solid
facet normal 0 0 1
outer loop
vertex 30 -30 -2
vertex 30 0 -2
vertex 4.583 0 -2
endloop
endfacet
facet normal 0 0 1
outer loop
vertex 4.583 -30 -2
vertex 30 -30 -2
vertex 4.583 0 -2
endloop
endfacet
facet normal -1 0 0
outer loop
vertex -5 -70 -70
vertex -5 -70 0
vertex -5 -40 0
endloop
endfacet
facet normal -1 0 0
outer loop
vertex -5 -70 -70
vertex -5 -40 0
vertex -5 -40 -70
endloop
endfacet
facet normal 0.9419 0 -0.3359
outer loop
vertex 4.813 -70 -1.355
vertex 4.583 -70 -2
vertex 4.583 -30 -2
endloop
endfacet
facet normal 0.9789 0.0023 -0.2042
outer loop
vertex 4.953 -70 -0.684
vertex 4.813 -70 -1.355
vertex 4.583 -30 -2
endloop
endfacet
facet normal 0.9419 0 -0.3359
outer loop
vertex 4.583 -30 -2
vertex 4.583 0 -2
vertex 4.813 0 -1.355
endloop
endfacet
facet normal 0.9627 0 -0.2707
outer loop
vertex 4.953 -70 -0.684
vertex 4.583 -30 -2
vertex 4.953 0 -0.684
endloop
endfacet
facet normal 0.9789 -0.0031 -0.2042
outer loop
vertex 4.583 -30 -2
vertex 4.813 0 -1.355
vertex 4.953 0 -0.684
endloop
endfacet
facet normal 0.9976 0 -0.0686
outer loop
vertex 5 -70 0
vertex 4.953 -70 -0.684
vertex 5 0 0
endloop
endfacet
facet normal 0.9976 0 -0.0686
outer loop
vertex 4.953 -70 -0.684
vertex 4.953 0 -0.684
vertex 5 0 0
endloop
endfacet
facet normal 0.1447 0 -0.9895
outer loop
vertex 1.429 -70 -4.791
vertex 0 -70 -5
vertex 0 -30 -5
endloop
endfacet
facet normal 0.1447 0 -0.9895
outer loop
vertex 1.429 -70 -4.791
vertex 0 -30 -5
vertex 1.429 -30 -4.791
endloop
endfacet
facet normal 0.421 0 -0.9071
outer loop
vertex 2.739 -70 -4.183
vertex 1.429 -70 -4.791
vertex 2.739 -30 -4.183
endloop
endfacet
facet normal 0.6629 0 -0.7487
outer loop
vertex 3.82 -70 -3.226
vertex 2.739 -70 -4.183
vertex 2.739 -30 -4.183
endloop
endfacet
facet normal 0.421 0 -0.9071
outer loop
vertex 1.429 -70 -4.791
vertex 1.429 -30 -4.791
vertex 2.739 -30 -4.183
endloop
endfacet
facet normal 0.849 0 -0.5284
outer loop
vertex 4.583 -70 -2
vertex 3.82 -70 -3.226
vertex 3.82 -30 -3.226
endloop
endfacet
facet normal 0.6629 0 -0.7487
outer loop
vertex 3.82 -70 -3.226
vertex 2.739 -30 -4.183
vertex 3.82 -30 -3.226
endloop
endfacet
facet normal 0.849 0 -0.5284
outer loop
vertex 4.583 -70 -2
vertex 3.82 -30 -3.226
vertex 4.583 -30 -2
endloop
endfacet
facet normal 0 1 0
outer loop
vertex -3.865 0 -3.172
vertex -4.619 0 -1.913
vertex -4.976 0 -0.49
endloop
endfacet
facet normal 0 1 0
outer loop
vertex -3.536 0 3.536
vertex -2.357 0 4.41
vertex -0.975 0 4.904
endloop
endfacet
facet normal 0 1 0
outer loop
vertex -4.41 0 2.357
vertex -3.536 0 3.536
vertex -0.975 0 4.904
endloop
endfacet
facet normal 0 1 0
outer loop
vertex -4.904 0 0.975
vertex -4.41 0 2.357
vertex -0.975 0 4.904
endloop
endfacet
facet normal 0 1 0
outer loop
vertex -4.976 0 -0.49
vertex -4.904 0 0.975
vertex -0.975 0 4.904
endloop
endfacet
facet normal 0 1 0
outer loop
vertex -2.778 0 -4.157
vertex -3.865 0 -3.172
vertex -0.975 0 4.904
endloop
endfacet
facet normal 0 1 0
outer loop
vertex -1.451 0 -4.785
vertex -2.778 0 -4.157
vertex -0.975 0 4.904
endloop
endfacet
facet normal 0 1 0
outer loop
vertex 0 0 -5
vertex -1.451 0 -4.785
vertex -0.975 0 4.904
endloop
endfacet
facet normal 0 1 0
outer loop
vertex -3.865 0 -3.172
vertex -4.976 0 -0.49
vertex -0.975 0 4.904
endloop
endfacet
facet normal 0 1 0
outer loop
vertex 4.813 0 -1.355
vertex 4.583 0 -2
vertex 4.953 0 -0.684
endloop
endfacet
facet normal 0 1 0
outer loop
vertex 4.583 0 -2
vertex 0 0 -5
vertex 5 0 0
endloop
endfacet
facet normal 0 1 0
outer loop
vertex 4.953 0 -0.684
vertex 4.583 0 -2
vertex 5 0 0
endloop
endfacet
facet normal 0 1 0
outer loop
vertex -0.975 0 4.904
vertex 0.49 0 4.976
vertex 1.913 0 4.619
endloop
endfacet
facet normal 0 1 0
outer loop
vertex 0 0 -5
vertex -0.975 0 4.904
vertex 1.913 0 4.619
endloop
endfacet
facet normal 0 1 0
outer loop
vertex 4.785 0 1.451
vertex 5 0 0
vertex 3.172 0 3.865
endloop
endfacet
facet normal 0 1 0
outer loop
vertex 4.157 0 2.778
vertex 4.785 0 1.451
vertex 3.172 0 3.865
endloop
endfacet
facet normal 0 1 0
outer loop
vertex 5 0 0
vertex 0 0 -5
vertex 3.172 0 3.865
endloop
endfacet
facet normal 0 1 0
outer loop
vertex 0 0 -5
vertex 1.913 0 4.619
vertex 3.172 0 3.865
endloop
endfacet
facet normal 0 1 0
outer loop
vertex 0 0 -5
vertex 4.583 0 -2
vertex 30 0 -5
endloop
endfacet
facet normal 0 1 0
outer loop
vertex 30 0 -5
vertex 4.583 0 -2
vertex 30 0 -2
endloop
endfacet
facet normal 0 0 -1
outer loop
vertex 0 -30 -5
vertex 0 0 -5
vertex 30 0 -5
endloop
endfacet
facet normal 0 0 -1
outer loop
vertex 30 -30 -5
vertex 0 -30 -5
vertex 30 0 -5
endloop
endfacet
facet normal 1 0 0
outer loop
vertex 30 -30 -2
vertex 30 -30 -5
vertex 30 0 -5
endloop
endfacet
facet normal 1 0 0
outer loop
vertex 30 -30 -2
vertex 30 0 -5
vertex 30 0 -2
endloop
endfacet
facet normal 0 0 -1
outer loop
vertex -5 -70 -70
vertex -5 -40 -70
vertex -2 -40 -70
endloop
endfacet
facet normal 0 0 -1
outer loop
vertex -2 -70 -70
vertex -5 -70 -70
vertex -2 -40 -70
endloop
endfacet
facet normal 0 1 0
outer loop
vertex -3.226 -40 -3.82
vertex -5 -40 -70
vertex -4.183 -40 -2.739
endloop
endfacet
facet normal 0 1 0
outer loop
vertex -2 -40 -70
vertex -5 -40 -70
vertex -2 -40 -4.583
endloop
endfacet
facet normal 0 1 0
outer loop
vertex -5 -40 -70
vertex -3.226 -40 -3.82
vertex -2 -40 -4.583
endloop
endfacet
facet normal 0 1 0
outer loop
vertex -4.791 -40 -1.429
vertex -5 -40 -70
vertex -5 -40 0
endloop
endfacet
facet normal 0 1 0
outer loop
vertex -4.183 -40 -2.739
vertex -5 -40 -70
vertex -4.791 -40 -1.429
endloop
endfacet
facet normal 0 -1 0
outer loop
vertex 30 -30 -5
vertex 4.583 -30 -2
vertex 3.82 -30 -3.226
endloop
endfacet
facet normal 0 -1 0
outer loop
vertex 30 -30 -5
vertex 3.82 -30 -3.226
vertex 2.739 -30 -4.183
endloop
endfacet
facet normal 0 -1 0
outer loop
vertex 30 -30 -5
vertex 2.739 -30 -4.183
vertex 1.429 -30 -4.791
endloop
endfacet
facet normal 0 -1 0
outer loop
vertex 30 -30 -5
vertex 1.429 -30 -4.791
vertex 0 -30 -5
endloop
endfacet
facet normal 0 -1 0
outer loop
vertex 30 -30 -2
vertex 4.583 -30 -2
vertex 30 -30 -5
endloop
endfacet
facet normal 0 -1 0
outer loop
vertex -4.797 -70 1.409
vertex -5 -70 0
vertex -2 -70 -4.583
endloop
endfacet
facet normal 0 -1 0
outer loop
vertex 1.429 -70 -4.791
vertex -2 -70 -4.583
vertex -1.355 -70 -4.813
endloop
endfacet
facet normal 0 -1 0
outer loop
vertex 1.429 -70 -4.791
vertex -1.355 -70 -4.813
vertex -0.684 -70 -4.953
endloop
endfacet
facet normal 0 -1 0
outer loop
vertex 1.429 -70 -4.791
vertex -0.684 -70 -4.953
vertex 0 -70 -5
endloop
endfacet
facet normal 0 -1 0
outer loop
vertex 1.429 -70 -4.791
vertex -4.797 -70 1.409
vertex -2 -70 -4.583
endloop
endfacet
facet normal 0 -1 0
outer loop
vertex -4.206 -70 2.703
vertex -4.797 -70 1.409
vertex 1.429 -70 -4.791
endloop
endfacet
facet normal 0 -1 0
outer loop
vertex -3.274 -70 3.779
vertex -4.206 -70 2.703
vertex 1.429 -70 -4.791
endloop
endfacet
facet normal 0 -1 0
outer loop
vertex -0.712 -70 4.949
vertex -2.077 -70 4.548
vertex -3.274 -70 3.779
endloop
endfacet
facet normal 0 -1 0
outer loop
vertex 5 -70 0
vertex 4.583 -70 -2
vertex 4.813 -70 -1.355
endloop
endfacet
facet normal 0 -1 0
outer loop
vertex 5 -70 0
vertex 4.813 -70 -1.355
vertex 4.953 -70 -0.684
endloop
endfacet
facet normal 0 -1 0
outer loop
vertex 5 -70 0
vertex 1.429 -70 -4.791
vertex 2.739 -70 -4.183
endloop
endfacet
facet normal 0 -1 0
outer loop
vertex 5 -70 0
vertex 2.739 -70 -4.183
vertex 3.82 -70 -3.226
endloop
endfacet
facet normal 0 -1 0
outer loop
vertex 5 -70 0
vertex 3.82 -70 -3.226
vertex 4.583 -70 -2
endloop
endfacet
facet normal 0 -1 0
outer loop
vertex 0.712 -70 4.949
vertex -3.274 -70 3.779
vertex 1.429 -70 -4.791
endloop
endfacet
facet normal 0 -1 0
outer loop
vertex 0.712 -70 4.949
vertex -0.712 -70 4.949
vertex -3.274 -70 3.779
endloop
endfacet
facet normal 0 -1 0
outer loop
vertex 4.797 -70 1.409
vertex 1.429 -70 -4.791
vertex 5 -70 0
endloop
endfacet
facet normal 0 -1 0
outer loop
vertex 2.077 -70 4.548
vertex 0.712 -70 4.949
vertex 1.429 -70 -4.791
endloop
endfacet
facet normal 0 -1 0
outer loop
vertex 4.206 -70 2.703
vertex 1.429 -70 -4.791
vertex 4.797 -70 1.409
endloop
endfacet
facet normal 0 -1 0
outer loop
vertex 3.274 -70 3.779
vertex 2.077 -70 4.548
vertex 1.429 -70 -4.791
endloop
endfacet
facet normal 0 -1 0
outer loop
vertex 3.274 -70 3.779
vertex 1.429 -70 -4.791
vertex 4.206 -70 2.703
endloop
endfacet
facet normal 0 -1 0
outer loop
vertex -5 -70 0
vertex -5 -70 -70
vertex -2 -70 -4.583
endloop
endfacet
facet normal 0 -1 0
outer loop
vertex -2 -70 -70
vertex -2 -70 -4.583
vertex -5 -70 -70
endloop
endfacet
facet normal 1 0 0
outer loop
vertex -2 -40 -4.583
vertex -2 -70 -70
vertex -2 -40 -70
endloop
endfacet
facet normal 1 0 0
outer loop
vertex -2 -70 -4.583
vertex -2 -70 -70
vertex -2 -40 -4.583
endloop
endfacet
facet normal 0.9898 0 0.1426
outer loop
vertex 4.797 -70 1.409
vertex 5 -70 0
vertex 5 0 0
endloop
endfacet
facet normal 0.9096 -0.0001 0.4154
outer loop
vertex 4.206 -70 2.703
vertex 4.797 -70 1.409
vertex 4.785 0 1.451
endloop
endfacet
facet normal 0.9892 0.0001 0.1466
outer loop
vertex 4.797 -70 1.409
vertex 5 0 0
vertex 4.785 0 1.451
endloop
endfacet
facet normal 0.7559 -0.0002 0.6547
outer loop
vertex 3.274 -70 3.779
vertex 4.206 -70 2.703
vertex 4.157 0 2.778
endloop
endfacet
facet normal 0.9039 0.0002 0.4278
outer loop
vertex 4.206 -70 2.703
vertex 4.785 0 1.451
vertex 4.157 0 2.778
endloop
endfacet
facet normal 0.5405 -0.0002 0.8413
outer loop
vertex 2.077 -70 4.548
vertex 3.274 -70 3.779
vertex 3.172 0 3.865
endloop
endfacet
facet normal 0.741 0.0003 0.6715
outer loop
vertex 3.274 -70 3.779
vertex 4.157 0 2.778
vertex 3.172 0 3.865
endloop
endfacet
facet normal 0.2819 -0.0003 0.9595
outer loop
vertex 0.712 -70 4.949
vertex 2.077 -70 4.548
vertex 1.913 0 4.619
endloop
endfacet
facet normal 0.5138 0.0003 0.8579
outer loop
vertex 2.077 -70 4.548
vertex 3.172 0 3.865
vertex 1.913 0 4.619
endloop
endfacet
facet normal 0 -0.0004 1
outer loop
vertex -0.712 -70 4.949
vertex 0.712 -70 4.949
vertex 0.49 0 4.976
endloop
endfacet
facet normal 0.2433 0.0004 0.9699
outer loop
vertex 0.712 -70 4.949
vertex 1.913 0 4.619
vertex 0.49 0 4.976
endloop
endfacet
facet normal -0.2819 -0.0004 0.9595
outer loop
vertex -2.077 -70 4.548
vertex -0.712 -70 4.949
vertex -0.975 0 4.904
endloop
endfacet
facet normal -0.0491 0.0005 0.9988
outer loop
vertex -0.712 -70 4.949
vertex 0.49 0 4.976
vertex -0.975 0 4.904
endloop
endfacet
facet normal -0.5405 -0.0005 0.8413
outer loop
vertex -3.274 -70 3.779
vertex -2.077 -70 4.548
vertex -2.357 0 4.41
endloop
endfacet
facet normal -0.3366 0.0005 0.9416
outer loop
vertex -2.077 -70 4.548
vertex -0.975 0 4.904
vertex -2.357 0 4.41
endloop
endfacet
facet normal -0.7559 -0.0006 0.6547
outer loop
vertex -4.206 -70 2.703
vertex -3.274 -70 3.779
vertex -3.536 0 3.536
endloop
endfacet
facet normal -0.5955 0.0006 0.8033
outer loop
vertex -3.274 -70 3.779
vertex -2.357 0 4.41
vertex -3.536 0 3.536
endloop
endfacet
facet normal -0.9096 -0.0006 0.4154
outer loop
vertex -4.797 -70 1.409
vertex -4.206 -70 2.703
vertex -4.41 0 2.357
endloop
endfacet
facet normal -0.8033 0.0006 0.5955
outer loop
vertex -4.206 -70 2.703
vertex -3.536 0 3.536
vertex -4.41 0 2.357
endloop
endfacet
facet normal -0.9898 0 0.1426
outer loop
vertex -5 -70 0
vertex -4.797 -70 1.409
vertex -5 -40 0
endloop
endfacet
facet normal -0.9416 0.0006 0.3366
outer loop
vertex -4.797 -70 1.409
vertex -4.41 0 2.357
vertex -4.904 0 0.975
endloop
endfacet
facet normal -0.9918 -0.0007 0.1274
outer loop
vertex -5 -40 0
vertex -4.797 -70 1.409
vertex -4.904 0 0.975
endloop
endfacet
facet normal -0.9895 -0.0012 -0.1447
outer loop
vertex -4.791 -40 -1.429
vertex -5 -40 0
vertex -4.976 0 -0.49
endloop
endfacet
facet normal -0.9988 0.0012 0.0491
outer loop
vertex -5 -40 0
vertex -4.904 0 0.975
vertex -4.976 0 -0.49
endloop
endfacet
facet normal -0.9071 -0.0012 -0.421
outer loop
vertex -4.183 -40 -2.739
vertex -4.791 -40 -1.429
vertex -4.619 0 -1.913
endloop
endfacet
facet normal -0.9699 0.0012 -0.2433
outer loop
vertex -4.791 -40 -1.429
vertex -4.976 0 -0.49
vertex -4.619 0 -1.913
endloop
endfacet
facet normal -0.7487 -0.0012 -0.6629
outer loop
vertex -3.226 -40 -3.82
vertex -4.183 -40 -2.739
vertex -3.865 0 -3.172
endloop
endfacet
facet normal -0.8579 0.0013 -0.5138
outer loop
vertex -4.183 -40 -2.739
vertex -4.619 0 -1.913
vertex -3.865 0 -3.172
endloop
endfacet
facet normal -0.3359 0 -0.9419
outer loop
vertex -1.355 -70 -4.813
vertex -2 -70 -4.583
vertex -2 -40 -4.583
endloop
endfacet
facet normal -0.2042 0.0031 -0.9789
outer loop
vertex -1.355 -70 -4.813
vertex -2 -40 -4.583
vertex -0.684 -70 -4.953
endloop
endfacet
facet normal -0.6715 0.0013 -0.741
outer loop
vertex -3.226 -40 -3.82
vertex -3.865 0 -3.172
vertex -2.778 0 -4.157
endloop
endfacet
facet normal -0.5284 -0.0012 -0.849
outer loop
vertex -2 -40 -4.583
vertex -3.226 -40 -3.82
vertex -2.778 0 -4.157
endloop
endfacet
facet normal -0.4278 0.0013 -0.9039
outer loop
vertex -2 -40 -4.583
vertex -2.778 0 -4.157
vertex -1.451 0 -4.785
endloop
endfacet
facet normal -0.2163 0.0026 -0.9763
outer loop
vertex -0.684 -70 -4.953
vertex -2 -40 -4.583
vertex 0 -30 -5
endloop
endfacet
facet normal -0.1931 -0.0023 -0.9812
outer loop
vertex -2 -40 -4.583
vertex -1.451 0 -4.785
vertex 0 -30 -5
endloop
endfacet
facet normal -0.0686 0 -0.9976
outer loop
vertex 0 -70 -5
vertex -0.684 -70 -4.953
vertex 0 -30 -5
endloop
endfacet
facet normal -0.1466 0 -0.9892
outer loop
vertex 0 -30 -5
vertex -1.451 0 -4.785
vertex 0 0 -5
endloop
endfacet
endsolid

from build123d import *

# Parameters (mm, degrees)
F1_DEPTH = 70
F2_DEPTH = 30
F4_DEPTH = 30


# Not quite as in the source:
# - a feature names something its author has since deleted; it is built from what else it names


with BuildPart() as f1:
    # F0 (on Front) → F1 (new body)
    with BuildSketch(Plane.XZ):
        with BuildLine():
            ThreePointArc((4.582575695, -2), (4.8945315647, -1.0215482184), (5, 0))
            ThreePointArc((5, 0), (-3.5355339059, 3.5355339059), (0, -5))
            Line((0, -5), (0, -2))
            Line((0, -2), (4.582575695, -2))
        make_face()
        with BuildLine():
            Line((0, -2), (0, -5))
            ThreePointArc((0, -5), (2.7386127875, -4.1833001327), (4.582575695, -2))
            Line((4.582575695, -2), (0, -2))
        make_face()
    extrude(amount=F1_DEPTH)

    # F0 (on Front) → F2 (join)
    with BuildSketch(Plane.XZ):
        with BuildLine():
            ThreePointArc((4.582575695, -2), (2.7386127875, -4.1833001327), (0, -5))
            Line((0, -5), (30, -5))
            Line((30, -5), (30, -2))
            Line((30, -2), (4.582575695, -2))
        make_face()
    extrude(amount=F2_DEPTH)

    # F3 (on face) → F4 (join)
    with BuildSketch(Plane.XZ.offset(70)):
        with BuildLine():
            Line((-2, -70), (-2, -4.582575695))
            ThreePointArc((-2, -4.582575695), (-4.1833001327, -2.7386127875), (-5, 0))
            Line((-5, 0), (-5, -70))
            Line((-5, -70), (-2, -70))
        make_face()
    extrude(amount=-F4_DEPTH)


solid = f1.part
